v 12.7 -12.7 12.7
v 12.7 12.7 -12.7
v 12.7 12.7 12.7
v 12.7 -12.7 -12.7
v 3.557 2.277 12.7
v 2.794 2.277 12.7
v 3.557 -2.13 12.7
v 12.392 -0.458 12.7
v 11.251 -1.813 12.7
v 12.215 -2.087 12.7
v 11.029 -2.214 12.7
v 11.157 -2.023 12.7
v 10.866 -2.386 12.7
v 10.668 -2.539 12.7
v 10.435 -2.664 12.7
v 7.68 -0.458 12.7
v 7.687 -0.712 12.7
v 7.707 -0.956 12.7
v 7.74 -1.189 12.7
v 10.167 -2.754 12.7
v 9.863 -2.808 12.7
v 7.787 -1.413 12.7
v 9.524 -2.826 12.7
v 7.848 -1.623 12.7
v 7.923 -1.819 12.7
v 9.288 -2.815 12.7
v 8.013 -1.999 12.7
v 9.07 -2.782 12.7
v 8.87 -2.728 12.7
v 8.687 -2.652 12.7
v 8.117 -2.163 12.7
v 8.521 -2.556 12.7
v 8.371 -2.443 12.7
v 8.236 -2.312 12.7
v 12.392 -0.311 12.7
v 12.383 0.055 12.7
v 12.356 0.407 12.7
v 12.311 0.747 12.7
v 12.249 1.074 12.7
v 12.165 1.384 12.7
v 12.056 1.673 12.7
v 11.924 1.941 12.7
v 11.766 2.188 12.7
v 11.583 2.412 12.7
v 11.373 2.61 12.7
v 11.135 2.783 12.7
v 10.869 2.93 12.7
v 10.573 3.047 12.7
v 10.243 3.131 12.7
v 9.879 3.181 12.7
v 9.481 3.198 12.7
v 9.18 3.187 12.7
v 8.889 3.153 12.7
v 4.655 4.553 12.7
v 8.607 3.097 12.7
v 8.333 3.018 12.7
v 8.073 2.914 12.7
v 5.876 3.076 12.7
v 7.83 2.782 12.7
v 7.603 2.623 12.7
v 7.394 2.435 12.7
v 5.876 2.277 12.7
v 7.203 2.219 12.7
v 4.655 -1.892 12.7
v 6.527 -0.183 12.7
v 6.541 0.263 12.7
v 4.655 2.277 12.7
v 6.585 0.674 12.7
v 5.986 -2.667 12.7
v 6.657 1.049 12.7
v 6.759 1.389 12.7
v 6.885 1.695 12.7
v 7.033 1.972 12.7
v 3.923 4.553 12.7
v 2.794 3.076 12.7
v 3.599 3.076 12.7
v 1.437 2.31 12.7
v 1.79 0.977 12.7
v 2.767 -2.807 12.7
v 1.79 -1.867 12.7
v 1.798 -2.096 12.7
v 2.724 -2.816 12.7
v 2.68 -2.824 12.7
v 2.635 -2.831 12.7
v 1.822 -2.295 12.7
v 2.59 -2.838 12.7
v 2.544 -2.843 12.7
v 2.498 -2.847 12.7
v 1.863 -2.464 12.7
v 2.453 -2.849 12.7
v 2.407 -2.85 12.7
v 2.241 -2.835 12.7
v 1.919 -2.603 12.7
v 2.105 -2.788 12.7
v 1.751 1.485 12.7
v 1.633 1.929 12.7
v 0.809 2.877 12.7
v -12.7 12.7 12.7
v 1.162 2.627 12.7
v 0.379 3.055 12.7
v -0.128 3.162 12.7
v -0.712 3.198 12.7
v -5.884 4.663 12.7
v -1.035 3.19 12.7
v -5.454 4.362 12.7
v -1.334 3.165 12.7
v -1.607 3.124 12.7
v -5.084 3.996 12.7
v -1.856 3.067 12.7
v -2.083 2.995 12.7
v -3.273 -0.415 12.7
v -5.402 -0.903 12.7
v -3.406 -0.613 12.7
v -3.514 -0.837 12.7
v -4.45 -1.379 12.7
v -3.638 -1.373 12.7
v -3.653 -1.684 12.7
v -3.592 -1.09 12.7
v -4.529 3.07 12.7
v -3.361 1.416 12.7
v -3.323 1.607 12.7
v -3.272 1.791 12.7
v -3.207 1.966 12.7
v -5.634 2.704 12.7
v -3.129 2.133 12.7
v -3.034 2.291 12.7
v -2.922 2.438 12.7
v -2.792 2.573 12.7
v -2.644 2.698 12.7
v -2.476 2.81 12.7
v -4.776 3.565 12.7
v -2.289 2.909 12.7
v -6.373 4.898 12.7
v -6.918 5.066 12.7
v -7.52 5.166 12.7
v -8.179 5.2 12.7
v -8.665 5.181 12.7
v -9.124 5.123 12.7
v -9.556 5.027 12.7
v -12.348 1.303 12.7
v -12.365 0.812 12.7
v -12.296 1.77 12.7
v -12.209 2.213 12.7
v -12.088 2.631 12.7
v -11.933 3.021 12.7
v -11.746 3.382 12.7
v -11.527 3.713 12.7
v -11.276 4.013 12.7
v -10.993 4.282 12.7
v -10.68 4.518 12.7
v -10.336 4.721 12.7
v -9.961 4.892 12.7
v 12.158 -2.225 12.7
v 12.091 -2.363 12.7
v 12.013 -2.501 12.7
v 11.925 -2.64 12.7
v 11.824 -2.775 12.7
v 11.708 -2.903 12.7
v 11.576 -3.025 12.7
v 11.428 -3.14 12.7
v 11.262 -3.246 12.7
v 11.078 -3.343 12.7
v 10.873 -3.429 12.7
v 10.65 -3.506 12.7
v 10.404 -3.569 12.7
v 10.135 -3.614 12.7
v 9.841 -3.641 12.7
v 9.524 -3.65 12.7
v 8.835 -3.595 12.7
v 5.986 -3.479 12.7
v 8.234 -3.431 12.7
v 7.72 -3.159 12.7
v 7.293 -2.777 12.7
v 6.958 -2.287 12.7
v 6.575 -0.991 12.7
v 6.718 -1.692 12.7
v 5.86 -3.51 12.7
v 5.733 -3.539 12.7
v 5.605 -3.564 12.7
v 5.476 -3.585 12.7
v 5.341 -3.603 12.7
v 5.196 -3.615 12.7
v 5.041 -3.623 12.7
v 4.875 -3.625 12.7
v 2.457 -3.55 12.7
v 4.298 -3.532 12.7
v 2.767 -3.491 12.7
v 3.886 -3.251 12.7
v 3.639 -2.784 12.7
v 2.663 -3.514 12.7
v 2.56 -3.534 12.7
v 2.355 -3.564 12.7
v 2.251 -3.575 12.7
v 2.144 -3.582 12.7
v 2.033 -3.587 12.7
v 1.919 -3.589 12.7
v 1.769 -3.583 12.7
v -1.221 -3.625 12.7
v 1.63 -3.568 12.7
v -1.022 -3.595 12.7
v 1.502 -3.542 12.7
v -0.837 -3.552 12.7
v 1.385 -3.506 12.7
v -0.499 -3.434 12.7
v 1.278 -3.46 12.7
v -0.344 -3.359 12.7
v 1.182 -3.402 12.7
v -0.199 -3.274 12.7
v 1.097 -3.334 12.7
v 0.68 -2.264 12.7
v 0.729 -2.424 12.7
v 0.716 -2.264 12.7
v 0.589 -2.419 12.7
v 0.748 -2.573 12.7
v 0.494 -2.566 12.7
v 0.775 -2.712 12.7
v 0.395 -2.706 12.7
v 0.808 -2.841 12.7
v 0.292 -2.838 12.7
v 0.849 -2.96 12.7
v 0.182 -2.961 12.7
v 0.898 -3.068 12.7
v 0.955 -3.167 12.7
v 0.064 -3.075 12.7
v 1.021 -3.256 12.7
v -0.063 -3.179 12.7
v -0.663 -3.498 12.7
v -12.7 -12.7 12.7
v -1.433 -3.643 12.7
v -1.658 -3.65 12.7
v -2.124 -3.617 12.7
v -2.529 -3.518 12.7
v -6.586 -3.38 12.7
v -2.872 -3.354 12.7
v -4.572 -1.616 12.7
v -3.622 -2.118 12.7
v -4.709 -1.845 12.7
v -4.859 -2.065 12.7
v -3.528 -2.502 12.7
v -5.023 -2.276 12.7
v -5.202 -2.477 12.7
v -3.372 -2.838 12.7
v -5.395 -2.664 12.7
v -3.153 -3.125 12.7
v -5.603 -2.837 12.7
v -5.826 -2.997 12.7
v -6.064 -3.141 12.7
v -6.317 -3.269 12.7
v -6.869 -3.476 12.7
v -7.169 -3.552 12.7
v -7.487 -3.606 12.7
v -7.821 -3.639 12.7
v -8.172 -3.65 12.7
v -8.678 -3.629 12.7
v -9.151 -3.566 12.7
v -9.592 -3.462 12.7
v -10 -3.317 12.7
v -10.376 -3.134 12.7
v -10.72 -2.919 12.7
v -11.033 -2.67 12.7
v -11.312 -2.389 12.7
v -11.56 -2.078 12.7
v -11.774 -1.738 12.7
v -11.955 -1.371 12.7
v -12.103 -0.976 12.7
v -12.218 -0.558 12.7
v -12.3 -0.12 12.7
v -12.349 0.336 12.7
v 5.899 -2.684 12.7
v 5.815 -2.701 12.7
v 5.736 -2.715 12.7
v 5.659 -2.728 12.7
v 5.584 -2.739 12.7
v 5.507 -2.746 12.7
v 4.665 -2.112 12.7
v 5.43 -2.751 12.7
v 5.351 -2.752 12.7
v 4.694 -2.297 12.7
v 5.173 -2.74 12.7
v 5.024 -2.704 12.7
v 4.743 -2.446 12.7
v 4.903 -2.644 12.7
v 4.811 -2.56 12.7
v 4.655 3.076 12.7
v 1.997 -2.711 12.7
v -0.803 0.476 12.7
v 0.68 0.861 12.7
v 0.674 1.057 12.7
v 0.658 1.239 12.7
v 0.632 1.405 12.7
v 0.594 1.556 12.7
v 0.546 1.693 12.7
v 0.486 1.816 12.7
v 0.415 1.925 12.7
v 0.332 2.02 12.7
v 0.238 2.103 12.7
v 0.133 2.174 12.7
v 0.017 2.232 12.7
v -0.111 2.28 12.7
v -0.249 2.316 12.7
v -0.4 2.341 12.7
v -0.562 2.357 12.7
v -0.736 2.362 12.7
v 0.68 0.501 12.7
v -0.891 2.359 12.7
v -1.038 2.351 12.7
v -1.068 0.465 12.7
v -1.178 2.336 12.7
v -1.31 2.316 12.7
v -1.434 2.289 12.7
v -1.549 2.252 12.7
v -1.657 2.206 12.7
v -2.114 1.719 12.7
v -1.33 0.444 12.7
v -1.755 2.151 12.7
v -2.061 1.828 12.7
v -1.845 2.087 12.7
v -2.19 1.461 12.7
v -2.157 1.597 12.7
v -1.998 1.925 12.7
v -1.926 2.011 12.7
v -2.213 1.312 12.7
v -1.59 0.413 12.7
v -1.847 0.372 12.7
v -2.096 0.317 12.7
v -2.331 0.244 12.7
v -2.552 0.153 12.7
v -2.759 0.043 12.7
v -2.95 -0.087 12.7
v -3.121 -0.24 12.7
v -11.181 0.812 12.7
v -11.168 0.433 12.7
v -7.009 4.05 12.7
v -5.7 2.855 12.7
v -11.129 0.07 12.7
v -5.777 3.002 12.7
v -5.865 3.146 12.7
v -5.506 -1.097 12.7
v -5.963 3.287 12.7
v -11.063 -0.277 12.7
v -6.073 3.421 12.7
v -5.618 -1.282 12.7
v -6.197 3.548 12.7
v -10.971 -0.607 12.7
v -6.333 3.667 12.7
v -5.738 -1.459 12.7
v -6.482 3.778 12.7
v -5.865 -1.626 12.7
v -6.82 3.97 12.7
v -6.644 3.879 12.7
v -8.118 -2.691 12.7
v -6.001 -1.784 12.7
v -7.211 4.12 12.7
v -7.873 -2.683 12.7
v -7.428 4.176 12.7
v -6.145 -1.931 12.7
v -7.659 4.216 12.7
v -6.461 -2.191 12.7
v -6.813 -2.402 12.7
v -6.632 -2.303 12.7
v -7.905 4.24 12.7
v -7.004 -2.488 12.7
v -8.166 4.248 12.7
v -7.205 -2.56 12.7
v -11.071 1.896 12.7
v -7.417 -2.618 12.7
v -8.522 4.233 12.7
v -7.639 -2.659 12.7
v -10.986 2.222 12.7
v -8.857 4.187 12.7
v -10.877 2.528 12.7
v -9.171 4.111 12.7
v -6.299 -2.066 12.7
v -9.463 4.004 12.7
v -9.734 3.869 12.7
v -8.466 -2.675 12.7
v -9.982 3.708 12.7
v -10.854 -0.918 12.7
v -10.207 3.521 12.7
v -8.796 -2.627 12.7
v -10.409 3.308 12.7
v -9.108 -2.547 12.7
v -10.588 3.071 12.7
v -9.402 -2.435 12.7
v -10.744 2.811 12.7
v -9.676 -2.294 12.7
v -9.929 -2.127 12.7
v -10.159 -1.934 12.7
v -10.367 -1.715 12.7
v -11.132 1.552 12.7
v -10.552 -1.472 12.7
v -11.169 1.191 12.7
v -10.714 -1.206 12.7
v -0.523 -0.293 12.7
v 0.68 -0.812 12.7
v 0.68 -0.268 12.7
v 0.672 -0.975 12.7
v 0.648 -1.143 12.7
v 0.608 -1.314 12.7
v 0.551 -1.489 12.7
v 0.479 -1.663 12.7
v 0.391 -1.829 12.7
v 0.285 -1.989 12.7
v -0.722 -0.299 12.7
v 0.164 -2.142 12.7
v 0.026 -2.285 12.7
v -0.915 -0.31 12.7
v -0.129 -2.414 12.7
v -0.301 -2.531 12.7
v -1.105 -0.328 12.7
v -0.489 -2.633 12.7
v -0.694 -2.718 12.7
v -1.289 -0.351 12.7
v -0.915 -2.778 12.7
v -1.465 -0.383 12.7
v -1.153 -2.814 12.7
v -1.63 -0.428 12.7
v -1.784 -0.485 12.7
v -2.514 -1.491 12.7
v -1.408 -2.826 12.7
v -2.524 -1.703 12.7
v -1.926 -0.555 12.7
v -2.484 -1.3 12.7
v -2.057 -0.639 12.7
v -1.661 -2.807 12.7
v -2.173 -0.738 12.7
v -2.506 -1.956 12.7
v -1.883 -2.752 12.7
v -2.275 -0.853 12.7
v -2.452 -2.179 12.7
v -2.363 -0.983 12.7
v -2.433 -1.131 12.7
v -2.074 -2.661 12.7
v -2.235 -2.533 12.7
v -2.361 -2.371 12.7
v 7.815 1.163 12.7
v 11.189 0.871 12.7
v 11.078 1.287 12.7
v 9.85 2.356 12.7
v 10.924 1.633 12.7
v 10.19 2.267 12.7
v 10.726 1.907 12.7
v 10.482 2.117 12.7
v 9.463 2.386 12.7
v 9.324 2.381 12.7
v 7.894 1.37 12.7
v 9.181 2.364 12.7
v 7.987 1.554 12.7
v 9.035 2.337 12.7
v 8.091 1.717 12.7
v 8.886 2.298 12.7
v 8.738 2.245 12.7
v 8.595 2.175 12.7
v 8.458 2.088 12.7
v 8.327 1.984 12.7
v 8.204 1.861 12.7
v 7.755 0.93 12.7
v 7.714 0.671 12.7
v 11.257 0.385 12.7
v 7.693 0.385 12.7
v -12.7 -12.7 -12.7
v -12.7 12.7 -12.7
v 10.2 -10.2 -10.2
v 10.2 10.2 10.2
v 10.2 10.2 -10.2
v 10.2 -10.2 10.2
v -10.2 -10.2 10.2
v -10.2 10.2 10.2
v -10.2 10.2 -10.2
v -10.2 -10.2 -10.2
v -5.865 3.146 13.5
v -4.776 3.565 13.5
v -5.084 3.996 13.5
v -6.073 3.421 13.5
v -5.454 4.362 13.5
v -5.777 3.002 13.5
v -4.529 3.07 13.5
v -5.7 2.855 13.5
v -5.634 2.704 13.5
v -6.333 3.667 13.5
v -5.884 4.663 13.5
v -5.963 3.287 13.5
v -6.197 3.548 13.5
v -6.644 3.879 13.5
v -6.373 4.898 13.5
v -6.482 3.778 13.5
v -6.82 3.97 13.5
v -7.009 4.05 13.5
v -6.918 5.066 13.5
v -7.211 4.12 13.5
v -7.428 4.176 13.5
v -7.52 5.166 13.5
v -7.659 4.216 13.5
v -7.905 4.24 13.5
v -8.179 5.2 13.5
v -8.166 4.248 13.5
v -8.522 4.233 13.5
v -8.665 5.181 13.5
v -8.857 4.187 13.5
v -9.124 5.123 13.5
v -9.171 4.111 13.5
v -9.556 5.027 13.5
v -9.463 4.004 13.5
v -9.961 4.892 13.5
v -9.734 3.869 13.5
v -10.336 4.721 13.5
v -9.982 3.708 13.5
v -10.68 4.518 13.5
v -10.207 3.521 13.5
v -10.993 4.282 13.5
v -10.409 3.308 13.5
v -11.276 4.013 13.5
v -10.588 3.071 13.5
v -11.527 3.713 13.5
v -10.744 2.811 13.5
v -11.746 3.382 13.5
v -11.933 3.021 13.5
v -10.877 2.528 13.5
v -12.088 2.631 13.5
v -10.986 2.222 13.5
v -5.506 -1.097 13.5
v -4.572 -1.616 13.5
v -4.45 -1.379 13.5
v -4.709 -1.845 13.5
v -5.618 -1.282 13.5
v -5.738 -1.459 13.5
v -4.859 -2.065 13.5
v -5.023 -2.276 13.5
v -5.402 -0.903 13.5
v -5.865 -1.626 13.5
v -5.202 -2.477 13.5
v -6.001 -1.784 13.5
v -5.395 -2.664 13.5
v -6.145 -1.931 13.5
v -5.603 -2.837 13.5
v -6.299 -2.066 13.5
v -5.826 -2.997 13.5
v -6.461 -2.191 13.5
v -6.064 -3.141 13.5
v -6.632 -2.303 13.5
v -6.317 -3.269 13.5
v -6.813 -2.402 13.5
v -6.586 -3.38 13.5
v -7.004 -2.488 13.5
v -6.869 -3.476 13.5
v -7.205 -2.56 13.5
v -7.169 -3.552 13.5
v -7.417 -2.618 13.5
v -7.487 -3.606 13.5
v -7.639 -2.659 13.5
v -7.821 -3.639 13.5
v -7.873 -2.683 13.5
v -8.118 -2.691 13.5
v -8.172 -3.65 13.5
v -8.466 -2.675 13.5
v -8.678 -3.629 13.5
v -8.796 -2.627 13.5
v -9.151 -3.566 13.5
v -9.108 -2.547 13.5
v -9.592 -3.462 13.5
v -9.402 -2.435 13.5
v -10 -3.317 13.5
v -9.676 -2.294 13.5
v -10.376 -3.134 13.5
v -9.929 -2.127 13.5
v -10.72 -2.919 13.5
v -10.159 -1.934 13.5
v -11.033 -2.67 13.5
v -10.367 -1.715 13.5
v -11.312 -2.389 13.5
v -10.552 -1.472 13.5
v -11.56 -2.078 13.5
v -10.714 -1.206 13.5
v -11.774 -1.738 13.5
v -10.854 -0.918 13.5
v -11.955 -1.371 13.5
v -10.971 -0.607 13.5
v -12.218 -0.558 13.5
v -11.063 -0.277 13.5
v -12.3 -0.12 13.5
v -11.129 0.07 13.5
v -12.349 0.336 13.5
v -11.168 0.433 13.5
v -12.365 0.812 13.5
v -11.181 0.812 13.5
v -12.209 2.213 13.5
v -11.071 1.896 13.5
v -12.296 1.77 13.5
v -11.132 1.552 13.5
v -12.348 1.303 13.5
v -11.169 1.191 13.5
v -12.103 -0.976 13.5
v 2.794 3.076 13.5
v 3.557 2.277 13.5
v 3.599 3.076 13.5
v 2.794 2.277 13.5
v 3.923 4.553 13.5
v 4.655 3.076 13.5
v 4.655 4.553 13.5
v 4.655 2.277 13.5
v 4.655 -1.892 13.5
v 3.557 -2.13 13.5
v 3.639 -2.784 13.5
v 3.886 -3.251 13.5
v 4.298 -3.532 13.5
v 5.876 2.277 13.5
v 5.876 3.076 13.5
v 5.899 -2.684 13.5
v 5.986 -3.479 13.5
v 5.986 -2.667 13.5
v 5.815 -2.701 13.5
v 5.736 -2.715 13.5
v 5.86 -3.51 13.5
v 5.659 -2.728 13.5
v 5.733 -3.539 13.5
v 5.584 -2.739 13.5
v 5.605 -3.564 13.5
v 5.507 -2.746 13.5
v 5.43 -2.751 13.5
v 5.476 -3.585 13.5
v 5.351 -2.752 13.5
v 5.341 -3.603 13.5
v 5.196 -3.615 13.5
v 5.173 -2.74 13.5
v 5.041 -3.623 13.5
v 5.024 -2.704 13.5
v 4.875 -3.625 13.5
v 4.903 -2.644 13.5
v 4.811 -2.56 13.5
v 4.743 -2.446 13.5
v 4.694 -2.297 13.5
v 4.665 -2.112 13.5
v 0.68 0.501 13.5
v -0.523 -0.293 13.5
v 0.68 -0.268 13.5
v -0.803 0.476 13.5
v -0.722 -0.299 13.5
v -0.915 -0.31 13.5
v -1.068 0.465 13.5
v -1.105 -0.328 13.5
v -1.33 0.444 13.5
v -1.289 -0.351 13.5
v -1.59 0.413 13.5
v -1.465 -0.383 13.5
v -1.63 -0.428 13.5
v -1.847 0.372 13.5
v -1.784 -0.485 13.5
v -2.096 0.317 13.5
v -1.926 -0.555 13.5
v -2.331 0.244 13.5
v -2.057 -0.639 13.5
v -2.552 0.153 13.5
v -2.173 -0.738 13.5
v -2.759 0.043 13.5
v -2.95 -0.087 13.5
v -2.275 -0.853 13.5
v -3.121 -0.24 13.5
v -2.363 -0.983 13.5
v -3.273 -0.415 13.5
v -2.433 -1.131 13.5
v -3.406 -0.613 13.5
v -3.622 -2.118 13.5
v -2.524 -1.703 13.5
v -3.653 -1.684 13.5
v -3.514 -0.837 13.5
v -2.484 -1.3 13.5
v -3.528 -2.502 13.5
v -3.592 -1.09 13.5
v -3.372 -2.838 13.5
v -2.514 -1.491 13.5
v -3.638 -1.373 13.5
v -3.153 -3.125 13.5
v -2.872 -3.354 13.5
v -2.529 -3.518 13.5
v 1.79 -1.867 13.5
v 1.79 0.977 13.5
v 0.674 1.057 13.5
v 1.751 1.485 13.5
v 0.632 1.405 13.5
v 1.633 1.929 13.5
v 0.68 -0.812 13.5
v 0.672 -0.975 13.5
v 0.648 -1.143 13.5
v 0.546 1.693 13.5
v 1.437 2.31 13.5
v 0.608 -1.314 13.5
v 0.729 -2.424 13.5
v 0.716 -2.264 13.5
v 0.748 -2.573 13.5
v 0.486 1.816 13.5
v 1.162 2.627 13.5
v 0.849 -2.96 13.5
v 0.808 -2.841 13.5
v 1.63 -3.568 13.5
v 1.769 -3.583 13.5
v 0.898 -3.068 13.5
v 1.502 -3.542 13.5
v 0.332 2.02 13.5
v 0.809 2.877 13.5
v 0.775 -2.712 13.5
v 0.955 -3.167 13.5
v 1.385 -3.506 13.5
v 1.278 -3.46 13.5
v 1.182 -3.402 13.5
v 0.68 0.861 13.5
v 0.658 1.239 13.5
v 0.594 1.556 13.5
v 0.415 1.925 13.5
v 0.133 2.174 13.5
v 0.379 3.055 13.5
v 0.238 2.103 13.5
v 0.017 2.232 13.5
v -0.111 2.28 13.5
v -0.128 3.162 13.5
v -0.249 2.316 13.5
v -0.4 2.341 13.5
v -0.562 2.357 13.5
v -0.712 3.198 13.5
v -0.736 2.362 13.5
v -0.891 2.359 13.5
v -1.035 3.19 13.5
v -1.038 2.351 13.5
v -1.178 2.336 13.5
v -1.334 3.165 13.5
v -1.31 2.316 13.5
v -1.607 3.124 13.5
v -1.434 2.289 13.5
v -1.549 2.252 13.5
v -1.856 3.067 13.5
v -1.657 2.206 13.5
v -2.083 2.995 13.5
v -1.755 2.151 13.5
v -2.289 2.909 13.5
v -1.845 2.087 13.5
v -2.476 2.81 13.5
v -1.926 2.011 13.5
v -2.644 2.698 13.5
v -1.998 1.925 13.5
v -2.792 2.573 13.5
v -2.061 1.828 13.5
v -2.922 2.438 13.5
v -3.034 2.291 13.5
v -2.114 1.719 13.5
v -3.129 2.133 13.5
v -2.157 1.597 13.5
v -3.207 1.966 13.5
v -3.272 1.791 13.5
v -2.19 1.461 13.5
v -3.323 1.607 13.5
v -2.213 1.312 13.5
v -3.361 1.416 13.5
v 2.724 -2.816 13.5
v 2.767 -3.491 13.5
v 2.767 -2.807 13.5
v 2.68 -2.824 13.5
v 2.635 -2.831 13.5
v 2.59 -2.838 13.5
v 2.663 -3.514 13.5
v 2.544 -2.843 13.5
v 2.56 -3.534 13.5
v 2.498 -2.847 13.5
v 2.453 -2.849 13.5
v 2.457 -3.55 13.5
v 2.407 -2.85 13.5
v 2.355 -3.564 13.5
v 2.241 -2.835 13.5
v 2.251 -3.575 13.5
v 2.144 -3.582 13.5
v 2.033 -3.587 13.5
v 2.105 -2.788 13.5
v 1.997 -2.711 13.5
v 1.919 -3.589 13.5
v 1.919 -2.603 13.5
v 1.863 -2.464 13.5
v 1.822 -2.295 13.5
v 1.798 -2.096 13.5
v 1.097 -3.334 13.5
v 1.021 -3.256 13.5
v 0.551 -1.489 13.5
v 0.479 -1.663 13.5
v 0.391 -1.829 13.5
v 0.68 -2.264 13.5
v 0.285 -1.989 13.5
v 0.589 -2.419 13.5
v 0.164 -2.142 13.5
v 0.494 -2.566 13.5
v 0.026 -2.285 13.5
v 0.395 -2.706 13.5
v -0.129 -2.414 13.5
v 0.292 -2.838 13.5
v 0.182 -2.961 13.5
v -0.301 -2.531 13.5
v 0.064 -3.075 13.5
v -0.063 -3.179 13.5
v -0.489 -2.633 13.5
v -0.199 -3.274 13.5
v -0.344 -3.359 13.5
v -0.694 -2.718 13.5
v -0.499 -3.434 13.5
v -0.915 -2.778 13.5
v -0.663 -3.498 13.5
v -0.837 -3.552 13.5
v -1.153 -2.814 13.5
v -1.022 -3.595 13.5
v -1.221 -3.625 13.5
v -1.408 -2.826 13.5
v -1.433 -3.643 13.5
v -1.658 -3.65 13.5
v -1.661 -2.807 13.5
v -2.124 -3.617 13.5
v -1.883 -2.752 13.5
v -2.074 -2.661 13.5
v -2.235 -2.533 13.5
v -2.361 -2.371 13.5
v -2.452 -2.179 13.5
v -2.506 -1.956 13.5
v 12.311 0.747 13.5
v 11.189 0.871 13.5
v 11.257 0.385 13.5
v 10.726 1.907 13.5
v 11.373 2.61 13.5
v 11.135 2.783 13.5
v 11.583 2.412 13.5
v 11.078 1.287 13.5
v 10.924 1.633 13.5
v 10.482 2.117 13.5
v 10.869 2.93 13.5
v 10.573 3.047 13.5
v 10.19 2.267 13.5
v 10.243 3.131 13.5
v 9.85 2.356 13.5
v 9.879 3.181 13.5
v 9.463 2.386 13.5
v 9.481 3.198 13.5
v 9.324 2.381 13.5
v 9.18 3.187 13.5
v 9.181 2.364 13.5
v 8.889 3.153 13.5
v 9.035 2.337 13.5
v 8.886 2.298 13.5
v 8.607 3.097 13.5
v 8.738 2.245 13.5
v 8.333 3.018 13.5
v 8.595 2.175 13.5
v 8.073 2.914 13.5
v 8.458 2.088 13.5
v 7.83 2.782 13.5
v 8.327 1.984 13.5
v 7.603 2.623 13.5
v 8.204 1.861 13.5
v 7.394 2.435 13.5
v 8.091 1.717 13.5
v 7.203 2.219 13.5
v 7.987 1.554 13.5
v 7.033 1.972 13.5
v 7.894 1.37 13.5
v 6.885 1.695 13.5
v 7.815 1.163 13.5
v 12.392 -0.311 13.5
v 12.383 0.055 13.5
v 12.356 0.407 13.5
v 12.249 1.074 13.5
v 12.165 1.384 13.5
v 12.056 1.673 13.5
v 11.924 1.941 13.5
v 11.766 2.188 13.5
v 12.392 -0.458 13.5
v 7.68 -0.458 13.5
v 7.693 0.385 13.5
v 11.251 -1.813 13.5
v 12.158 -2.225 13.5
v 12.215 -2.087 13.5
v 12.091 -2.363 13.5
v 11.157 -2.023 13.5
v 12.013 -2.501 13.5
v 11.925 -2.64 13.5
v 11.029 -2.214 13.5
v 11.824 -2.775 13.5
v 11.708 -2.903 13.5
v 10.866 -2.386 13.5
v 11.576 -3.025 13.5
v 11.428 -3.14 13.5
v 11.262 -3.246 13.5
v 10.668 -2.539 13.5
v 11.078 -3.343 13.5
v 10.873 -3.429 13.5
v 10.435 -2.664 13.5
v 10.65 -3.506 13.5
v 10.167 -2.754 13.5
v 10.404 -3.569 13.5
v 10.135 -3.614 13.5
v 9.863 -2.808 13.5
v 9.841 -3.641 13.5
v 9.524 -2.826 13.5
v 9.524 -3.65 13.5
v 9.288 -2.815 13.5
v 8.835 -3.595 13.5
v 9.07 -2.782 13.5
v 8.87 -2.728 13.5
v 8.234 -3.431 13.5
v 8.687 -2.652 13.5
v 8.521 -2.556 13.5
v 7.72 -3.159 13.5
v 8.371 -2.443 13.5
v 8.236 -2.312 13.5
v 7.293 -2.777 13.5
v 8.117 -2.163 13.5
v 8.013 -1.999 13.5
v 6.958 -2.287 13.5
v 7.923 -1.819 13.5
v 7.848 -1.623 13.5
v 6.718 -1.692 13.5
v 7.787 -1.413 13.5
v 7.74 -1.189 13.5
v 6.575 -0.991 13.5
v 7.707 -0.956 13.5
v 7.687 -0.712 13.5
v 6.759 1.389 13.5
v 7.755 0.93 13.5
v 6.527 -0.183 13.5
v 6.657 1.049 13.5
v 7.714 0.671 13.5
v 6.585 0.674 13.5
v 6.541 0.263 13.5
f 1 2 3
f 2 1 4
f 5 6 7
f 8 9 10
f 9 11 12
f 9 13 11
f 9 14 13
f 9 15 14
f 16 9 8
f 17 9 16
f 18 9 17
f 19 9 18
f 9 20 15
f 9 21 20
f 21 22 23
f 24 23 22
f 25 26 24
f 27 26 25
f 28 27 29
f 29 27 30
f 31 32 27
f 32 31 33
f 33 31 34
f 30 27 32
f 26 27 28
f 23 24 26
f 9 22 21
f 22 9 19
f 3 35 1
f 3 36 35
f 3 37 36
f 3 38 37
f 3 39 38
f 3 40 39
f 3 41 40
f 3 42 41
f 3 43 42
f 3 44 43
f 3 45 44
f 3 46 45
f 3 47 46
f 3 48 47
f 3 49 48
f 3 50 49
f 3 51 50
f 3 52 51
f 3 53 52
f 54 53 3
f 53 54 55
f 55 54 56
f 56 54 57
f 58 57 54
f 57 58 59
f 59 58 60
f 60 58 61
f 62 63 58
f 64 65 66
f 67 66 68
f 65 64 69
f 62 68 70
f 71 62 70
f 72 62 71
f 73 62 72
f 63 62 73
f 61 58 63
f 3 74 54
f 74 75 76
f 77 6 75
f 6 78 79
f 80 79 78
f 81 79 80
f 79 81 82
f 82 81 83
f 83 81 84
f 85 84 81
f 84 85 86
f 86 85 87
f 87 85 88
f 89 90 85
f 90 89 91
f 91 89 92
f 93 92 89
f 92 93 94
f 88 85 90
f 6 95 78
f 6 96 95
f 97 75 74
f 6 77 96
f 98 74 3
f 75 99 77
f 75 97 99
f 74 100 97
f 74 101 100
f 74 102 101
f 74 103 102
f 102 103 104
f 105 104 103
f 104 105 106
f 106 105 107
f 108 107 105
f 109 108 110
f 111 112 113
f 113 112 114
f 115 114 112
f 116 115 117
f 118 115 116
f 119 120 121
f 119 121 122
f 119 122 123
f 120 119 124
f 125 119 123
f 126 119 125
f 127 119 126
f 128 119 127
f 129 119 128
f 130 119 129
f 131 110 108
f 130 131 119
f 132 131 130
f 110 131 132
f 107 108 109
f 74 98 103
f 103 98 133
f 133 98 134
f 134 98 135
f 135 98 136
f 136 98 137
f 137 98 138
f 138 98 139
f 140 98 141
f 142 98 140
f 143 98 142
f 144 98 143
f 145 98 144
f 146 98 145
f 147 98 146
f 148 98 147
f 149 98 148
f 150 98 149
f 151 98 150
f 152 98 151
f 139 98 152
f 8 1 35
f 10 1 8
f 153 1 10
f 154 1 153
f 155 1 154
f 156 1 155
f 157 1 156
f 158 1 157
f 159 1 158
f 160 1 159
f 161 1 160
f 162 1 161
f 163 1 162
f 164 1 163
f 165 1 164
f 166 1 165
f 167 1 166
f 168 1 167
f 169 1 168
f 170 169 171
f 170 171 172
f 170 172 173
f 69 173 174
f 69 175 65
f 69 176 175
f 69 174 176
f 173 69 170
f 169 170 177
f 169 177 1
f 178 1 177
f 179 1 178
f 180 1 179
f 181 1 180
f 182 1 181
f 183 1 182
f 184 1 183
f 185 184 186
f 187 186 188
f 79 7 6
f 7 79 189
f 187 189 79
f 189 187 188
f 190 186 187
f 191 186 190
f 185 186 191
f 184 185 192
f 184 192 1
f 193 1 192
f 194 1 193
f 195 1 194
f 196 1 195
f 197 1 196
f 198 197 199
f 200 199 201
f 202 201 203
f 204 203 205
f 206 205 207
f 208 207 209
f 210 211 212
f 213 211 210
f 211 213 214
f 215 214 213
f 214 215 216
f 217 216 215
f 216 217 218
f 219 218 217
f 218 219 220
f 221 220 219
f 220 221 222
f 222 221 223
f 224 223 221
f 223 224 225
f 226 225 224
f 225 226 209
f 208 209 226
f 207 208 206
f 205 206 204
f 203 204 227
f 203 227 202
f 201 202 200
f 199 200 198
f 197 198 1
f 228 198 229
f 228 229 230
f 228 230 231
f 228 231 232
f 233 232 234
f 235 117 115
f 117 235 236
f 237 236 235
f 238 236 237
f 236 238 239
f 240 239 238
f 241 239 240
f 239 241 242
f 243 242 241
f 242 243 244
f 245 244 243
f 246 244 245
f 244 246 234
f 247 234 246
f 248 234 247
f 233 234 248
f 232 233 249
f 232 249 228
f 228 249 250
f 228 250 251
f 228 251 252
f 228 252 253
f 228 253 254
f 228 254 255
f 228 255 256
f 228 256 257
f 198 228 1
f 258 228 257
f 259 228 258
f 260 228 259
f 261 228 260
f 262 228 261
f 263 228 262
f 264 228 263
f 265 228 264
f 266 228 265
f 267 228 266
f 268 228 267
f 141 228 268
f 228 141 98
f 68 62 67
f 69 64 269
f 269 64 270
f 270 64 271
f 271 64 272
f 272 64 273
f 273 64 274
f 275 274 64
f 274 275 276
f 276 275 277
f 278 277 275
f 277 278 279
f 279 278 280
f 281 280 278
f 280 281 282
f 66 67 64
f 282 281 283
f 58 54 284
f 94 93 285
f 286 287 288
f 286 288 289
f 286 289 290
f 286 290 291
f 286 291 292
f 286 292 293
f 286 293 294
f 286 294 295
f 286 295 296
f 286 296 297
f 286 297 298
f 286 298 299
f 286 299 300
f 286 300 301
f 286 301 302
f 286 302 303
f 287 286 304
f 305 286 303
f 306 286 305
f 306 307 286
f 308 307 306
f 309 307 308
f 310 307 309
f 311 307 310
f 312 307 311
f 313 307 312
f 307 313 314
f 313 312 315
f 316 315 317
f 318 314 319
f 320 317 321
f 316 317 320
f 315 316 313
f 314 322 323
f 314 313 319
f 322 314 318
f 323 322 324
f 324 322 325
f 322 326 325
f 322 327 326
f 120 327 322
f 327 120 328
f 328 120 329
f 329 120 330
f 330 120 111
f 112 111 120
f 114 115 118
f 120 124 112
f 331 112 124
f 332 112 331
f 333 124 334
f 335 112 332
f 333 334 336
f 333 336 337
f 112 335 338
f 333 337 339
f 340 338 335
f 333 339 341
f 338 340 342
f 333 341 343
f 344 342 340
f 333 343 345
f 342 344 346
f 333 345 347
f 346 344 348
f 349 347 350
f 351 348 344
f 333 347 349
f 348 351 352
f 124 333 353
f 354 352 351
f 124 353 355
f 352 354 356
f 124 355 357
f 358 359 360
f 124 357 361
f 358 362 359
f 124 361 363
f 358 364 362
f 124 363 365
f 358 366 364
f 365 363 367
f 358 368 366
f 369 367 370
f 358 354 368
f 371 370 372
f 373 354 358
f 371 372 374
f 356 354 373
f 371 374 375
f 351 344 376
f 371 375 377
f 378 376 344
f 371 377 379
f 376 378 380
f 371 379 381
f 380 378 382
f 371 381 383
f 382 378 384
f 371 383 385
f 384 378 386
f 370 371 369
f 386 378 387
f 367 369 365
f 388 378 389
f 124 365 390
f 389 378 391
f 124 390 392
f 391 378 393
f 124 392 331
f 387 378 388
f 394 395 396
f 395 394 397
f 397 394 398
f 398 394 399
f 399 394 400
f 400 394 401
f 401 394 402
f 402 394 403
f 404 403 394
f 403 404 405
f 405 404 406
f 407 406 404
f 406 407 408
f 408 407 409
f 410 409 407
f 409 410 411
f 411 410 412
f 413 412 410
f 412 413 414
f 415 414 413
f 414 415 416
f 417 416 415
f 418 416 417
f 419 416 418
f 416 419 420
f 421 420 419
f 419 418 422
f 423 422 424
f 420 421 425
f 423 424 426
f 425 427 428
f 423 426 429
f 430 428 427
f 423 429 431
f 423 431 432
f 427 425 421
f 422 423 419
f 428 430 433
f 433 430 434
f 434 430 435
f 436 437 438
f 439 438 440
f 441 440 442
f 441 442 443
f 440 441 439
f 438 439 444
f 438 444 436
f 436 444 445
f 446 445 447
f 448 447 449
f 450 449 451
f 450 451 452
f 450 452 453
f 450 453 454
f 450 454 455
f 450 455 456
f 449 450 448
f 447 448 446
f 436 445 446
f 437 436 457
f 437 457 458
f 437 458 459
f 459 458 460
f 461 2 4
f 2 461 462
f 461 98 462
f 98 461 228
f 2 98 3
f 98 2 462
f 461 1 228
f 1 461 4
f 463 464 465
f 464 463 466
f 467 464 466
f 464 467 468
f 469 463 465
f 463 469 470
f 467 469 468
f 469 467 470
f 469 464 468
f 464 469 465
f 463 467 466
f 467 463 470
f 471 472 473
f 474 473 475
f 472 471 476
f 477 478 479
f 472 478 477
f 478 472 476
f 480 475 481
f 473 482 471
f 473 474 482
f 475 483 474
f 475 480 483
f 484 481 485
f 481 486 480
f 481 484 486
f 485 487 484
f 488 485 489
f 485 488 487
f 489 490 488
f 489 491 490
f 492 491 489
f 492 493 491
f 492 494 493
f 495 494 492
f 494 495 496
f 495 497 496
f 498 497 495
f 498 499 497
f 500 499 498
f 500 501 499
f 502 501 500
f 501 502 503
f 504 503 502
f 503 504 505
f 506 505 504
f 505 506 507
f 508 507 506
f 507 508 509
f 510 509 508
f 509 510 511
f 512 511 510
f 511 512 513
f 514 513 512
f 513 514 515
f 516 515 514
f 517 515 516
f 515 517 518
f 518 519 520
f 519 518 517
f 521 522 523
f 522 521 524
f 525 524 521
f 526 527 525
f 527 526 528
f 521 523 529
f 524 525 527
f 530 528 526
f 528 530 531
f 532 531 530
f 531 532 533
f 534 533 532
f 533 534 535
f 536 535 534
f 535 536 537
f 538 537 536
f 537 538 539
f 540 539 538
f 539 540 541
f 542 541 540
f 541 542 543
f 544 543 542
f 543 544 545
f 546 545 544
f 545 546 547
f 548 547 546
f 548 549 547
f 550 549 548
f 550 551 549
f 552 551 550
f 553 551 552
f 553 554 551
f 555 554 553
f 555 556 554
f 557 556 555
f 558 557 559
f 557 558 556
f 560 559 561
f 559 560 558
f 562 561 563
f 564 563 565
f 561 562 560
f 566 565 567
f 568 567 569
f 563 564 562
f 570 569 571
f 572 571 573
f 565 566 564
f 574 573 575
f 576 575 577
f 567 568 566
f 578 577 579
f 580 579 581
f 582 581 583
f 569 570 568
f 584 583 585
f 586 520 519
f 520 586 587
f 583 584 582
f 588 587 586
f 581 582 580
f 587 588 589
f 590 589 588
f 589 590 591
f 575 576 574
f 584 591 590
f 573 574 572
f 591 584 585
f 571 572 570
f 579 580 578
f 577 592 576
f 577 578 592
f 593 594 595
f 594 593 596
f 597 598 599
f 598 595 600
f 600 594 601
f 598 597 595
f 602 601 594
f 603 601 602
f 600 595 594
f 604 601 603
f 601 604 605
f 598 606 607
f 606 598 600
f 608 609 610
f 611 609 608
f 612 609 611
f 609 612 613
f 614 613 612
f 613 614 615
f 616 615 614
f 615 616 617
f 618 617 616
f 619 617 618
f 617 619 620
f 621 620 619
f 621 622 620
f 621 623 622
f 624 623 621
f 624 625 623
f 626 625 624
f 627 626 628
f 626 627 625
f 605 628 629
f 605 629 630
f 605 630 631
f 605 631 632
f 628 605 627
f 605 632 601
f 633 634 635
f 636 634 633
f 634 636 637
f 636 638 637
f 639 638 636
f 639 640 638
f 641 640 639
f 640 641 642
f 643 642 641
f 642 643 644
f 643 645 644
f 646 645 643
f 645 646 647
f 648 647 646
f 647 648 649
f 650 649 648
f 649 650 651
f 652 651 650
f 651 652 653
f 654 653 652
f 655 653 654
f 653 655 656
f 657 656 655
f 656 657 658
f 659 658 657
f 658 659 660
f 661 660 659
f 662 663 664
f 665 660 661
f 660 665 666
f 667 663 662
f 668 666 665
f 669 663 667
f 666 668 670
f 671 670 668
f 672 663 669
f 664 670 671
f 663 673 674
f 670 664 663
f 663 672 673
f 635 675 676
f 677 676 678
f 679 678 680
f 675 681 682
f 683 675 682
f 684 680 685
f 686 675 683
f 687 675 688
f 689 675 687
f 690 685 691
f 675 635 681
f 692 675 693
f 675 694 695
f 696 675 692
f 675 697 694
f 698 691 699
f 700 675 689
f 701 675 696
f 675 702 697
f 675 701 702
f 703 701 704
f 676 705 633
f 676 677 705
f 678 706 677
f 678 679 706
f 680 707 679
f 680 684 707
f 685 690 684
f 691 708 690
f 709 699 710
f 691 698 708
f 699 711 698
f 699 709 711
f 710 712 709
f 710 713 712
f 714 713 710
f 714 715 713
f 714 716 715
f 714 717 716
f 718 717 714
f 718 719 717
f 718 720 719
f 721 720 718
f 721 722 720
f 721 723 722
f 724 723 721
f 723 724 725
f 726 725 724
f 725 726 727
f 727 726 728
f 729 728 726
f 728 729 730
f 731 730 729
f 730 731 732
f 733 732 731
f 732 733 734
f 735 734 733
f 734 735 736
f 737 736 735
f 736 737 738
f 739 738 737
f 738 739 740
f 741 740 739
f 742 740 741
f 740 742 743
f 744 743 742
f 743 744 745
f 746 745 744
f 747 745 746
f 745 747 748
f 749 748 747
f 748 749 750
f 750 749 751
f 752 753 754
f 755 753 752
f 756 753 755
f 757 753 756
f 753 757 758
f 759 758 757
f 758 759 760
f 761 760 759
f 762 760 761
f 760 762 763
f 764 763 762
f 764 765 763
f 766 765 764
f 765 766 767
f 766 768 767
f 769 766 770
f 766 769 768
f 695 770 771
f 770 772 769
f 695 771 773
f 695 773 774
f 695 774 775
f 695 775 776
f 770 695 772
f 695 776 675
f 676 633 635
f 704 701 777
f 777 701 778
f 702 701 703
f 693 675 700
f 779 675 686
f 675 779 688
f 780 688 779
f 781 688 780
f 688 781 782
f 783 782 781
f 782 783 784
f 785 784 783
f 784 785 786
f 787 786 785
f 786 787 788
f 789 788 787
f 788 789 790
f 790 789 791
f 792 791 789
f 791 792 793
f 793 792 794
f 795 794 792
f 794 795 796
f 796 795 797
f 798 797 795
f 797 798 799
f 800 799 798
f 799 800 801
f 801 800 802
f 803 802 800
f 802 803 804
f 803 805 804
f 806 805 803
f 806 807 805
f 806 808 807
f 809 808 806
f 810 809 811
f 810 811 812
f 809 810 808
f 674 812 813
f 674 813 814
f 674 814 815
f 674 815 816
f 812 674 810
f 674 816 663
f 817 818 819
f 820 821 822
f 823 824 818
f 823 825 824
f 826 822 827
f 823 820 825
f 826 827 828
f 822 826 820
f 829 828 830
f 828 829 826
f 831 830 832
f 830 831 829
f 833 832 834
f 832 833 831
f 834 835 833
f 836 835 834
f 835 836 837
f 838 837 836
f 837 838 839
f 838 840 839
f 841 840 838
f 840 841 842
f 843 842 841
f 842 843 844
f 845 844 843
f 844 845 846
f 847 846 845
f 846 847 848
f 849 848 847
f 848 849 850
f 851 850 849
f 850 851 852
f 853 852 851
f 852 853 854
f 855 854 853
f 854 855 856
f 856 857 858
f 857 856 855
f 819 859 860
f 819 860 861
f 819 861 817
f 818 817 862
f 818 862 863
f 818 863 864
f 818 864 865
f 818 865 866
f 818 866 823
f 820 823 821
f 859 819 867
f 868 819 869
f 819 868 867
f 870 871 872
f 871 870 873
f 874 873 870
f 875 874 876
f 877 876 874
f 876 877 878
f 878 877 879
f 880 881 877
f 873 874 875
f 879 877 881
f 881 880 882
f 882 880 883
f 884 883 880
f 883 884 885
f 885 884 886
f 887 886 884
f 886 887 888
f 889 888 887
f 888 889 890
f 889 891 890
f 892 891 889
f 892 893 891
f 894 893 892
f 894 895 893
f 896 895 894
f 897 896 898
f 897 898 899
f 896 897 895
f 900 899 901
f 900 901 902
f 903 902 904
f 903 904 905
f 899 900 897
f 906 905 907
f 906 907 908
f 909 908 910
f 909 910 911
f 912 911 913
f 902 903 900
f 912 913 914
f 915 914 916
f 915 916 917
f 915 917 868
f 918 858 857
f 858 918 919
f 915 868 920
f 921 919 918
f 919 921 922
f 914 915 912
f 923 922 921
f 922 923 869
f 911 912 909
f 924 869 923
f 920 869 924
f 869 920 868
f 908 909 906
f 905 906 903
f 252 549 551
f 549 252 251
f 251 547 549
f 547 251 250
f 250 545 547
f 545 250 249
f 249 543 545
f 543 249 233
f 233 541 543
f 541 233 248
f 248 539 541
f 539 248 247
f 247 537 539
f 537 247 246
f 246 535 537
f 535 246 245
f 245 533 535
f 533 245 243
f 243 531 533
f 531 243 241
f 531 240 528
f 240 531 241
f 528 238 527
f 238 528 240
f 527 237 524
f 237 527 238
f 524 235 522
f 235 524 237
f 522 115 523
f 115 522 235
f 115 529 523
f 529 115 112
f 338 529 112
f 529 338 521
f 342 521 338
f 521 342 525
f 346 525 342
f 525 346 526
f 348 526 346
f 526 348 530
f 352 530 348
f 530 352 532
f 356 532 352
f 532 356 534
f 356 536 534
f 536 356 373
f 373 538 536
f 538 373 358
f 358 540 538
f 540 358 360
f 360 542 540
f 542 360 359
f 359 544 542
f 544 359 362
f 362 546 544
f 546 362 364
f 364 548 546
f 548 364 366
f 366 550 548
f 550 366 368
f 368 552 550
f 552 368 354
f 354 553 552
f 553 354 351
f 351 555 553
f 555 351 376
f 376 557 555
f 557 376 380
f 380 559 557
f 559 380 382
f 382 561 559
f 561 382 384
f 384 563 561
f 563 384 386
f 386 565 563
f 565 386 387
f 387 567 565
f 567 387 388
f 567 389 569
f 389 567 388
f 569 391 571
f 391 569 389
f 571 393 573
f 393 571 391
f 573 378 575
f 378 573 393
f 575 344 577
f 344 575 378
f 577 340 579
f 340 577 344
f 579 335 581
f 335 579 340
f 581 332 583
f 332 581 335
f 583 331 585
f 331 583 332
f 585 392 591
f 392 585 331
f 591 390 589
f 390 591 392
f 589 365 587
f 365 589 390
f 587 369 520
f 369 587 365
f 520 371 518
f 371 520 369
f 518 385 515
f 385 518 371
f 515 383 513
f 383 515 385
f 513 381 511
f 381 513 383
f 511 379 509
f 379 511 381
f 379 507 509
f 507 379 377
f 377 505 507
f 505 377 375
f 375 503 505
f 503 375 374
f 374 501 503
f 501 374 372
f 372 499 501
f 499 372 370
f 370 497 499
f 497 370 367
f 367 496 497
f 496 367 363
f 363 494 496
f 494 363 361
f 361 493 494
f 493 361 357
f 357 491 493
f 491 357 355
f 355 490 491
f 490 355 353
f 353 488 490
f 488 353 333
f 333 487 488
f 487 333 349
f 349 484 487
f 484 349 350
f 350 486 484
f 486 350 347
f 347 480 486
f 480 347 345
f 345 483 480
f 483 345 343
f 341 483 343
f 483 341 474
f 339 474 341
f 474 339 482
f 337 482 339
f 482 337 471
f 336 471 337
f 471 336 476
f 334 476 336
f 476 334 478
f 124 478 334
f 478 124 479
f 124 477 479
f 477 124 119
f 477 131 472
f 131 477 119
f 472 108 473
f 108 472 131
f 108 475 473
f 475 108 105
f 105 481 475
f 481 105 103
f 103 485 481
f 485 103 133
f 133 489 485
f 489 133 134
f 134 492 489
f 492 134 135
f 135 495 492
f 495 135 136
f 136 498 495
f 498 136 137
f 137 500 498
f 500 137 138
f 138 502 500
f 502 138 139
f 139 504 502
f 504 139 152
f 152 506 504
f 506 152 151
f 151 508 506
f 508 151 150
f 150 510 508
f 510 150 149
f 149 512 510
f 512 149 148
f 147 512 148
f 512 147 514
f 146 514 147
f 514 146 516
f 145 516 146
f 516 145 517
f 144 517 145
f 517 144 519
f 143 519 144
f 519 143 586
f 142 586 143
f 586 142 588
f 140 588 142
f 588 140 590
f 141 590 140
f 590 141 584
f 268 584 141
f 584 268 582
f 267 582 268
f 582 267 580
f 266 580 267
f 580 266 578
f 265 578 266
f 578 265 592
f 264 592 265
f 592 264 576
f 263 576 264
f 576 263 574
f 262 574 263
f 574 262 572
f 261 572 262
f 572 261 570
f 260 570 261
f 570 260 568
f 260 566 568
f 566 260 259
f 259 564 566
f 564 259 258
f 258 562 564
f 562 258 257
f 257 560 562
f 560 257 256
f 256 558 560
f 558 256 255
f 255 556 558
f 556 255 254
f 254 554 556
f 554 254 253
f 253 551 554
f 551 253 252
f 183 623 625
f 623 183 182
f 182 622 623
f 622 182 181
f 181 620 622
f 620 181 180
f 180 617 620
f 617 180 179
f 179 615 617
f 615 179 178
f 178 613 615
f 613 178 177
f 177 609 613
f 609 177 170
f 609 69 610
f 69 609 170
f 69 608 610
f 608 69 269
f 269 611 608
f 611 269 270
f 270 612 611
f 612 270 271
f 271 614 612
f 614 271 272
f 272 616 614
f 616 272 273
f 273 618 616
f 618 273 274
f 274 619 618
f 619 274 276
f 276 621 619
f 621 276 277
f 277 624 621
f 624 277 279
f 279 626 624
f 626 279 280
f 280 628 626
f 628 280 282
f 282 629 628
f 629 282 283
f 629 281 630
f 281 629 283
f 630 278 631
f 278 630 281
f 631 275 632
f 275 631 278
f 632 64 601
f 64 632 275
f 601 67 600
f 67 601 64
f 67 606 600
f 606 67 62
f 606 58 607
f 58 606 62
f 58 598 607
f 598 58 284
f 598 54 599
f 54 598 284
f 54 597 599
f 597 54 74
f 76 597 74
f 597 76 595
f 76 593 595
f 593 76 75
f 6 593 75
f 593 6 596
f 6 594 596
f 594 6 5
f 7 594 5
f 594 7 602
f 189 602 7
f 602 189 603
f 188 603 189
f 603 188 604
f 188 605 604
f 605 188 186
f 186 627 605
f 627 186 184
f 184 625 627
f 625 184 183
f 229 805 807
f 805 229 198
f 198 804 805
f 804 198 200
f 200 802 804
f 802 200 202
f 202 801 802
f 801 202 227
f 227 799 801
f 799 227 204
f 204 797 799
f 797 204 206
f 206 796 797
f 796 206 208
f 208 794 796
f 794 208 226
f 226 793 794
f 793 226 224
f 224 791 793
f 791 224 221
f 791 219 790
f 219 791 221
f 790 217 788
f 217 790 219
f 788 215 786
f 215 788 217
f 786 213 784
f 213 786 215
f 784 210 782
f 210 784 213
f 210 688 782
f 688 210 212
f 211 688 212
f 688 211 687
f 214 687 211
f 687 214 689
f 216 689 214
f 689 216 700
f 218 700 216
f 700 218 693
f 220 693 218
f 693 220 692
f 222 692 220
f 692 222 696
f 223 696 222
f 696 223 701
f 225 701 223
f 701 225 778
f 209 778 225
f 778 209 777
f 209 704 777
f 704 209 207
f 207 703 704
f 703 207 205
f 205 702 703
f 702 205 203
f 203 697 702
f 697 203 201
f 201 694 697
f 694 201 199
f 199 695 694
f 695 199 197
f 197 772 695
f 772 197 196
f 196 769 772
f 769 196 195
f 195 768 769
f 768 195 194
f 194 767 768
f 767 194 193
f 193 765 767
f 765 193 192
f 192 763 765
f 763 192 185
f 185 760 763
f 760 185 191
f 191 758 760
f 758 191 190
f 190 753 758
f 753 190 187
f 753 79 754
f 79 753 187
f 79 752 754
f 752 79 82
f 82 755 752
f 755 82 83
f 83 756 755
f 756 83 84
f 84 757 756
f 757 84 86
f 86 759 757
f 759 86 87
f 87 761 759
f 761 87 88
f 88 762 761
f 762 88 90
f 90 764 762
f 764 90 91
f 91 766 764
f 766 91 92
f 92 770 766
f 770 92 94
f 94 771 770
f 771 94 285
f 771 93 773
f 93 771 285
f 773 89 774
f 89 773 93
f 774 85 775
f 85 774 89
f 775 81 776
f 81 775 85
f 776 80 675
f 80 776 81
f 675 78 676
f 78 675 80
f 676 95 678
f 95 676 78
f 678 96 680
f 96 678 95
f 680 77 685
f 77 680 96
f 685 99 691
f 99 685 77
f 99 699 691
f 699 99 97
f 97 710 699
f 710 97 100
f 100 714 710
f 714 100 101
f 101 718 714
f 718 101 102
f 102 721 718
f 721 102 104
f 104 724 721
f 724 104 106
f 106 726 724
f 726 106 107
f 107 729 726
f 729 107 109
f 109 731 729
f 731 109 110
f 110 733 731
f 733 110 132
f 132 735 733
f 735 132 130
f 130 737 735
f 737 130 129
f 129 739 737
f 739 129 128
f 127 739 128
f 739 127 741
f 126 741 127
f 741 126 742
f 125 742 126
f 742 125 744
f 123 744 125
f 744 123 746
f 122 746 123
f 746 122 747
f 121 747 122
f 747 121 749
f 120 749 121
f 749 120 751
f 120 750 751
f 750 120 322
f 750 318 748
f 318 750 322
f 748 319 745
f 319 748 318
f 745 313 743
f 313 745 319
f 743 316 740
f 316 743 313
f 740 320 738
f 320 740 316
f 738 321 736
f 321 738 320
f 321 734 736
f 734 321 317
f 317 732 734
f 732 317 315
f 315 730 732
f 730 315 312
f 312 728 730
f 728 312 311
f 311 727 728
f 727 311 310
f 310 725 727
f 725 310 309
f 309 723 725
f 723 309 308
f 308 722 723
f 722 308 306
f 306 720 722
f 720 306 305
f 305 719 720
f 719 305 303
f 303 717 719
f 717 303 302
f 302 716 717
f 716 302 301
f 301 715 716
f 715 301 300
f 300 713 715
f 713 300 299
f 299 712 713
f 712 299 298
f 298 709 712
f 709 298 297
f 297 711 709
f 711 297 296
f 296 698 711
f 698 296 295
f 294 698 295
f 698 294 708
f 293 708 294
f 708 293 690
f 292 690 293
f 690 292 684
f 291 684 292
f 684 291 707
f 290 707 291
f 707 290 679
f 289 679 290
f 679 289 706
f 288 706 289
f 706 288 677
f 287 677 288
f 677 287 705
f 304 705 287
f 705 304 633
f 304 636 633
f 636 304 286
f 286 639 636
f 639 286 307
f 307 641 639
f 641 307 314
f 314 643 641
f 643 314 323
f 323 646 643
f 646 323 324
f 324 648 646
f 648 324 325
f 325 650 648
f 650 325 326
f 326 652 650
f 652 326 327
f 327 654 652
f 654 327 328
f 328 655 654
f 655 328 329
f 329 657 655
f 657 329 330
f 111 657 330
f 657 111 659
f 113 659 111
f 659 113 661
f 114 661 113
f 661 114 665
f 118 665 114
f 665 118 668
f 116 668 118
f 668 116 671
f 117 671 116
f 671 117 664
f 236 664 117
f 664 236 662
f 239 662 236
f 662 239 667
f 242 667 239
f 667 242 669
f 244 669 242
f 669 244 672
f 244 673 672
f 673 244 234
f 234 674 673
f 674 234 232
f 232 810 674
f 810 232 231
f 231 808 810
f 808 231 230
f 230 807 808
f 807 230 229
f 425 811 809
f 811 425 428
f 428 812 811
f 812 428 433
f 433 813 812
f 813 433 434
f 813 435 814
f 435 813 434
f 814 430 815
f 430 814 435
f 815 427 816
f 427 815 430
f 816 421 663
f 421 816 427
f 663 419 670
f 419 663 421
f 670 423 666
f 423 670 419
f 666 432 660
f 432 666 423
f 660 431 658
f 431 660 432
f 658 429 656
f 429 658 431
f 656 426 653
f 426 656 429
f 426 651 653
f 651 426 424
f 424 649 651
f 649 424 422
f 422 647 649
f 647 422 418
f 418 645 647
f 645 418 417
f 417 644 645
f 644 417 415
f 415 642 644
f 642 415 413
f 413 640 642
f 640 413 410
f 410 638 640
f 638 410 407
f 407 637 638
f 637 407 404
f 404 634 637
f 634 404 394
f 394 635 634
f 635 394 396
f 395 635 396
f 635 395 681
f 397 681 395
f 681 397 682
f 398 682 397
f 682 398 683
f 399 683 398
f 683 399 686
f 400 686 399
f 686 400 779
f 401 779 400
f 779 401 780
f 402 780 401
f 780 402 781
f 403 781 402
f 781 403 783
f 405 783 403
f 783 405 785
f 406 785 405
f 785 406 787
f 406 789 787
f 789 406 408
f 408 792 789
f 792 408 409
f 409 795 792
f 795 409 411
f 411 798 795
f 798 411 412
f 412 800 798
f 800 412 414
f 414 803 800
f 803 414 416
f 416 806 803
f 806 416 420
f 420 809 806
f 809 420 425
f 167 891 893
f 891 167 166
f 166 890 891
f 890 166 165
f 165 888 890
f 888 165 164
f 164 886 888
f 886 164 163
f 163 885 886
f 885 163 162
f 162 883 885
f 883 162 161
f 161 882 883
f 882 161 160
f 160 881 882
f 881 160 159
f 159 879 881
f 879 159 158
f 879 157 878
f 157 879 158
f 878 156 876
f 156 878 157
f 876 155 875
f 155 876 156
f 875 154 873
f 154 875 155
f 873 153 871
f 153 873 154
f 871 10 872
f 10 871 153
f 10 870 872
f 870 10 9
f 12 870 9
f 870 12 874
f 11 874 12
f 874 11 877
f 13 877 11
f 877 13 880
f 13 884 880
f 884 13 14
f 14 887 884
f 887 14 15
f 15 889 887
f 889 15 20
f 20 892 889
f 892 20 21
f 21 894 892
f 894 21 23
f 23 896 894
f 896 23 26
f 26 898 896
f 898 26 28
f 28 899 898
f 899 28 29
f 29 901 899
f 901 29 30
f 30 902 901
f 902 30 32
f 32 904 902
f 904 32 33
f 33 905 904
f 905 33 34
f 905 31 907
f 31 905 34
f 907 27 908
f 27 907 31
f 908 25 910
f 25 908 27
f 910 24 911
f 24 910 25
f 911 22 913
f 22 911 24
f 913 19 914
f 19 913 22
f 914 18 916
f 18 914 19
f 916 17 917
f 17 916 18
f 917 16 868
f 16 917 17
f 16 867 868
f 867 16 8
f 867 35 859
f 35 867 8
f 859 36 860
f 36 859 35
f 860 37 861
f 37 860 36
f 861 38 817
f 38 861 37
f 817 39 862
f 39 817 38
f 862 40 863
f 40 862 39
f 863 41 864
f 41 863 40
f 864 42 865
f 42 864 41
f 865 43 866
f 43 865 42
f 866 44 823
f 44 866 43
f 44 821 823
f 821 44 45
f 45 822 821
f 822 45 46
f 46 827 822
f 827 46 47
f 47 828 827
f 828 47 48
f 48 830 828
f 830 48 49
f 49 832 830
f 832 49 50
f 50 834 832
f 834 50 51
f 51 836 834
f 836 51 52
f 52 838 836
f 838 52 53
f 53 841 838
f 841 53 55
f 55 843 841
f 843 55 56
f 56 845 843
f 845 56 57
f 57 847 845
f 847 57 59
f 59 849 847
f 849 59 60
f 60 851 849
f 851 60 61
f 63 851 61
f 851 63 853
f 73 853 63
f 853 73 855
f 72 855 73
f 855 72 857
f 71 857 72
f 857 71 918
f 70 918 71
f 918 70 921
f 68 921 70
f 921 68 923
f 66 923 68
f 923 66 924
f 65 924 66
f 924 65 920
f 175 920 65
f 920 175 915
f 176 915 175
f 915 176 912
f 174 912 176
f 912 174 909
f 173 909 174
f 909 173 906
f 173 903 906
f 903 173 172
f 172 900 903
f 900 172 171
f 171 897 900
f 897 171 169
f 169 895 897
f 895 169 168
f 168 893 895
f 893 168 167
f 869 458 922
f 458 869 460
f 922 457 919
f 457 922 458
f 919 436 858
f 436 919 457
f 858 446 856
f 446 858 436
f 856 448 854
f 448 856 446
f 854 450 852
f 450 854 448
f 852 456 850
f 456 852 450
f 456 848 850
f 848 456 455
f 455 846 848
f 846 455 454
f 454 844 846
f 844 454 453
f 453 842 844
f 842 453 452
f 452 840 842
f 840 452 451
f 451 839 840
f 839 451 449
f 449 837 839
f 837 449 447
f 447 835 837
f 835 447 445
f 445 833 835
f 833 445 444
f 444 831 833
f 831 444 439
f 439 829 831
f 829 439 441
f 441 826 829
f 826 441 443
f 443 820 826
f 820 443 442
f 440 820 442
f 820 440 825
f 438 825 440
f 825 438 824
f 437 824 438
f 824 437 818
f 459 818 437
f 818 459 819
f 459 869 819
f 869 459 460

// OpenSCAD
inch = 25.4;

// Cube w/in a Cube
difference() {
    color("blue", 0.10) cube([inch,inch,inch], center=true);
    color("red",.10) cube([inch-5,inch-5,inch-5], center=true);
}

translate([-13,5,12.5]) {
    color("green") linear_extrude(height=1) {
        text("Cate", size=9, valign="top");
    }
}
